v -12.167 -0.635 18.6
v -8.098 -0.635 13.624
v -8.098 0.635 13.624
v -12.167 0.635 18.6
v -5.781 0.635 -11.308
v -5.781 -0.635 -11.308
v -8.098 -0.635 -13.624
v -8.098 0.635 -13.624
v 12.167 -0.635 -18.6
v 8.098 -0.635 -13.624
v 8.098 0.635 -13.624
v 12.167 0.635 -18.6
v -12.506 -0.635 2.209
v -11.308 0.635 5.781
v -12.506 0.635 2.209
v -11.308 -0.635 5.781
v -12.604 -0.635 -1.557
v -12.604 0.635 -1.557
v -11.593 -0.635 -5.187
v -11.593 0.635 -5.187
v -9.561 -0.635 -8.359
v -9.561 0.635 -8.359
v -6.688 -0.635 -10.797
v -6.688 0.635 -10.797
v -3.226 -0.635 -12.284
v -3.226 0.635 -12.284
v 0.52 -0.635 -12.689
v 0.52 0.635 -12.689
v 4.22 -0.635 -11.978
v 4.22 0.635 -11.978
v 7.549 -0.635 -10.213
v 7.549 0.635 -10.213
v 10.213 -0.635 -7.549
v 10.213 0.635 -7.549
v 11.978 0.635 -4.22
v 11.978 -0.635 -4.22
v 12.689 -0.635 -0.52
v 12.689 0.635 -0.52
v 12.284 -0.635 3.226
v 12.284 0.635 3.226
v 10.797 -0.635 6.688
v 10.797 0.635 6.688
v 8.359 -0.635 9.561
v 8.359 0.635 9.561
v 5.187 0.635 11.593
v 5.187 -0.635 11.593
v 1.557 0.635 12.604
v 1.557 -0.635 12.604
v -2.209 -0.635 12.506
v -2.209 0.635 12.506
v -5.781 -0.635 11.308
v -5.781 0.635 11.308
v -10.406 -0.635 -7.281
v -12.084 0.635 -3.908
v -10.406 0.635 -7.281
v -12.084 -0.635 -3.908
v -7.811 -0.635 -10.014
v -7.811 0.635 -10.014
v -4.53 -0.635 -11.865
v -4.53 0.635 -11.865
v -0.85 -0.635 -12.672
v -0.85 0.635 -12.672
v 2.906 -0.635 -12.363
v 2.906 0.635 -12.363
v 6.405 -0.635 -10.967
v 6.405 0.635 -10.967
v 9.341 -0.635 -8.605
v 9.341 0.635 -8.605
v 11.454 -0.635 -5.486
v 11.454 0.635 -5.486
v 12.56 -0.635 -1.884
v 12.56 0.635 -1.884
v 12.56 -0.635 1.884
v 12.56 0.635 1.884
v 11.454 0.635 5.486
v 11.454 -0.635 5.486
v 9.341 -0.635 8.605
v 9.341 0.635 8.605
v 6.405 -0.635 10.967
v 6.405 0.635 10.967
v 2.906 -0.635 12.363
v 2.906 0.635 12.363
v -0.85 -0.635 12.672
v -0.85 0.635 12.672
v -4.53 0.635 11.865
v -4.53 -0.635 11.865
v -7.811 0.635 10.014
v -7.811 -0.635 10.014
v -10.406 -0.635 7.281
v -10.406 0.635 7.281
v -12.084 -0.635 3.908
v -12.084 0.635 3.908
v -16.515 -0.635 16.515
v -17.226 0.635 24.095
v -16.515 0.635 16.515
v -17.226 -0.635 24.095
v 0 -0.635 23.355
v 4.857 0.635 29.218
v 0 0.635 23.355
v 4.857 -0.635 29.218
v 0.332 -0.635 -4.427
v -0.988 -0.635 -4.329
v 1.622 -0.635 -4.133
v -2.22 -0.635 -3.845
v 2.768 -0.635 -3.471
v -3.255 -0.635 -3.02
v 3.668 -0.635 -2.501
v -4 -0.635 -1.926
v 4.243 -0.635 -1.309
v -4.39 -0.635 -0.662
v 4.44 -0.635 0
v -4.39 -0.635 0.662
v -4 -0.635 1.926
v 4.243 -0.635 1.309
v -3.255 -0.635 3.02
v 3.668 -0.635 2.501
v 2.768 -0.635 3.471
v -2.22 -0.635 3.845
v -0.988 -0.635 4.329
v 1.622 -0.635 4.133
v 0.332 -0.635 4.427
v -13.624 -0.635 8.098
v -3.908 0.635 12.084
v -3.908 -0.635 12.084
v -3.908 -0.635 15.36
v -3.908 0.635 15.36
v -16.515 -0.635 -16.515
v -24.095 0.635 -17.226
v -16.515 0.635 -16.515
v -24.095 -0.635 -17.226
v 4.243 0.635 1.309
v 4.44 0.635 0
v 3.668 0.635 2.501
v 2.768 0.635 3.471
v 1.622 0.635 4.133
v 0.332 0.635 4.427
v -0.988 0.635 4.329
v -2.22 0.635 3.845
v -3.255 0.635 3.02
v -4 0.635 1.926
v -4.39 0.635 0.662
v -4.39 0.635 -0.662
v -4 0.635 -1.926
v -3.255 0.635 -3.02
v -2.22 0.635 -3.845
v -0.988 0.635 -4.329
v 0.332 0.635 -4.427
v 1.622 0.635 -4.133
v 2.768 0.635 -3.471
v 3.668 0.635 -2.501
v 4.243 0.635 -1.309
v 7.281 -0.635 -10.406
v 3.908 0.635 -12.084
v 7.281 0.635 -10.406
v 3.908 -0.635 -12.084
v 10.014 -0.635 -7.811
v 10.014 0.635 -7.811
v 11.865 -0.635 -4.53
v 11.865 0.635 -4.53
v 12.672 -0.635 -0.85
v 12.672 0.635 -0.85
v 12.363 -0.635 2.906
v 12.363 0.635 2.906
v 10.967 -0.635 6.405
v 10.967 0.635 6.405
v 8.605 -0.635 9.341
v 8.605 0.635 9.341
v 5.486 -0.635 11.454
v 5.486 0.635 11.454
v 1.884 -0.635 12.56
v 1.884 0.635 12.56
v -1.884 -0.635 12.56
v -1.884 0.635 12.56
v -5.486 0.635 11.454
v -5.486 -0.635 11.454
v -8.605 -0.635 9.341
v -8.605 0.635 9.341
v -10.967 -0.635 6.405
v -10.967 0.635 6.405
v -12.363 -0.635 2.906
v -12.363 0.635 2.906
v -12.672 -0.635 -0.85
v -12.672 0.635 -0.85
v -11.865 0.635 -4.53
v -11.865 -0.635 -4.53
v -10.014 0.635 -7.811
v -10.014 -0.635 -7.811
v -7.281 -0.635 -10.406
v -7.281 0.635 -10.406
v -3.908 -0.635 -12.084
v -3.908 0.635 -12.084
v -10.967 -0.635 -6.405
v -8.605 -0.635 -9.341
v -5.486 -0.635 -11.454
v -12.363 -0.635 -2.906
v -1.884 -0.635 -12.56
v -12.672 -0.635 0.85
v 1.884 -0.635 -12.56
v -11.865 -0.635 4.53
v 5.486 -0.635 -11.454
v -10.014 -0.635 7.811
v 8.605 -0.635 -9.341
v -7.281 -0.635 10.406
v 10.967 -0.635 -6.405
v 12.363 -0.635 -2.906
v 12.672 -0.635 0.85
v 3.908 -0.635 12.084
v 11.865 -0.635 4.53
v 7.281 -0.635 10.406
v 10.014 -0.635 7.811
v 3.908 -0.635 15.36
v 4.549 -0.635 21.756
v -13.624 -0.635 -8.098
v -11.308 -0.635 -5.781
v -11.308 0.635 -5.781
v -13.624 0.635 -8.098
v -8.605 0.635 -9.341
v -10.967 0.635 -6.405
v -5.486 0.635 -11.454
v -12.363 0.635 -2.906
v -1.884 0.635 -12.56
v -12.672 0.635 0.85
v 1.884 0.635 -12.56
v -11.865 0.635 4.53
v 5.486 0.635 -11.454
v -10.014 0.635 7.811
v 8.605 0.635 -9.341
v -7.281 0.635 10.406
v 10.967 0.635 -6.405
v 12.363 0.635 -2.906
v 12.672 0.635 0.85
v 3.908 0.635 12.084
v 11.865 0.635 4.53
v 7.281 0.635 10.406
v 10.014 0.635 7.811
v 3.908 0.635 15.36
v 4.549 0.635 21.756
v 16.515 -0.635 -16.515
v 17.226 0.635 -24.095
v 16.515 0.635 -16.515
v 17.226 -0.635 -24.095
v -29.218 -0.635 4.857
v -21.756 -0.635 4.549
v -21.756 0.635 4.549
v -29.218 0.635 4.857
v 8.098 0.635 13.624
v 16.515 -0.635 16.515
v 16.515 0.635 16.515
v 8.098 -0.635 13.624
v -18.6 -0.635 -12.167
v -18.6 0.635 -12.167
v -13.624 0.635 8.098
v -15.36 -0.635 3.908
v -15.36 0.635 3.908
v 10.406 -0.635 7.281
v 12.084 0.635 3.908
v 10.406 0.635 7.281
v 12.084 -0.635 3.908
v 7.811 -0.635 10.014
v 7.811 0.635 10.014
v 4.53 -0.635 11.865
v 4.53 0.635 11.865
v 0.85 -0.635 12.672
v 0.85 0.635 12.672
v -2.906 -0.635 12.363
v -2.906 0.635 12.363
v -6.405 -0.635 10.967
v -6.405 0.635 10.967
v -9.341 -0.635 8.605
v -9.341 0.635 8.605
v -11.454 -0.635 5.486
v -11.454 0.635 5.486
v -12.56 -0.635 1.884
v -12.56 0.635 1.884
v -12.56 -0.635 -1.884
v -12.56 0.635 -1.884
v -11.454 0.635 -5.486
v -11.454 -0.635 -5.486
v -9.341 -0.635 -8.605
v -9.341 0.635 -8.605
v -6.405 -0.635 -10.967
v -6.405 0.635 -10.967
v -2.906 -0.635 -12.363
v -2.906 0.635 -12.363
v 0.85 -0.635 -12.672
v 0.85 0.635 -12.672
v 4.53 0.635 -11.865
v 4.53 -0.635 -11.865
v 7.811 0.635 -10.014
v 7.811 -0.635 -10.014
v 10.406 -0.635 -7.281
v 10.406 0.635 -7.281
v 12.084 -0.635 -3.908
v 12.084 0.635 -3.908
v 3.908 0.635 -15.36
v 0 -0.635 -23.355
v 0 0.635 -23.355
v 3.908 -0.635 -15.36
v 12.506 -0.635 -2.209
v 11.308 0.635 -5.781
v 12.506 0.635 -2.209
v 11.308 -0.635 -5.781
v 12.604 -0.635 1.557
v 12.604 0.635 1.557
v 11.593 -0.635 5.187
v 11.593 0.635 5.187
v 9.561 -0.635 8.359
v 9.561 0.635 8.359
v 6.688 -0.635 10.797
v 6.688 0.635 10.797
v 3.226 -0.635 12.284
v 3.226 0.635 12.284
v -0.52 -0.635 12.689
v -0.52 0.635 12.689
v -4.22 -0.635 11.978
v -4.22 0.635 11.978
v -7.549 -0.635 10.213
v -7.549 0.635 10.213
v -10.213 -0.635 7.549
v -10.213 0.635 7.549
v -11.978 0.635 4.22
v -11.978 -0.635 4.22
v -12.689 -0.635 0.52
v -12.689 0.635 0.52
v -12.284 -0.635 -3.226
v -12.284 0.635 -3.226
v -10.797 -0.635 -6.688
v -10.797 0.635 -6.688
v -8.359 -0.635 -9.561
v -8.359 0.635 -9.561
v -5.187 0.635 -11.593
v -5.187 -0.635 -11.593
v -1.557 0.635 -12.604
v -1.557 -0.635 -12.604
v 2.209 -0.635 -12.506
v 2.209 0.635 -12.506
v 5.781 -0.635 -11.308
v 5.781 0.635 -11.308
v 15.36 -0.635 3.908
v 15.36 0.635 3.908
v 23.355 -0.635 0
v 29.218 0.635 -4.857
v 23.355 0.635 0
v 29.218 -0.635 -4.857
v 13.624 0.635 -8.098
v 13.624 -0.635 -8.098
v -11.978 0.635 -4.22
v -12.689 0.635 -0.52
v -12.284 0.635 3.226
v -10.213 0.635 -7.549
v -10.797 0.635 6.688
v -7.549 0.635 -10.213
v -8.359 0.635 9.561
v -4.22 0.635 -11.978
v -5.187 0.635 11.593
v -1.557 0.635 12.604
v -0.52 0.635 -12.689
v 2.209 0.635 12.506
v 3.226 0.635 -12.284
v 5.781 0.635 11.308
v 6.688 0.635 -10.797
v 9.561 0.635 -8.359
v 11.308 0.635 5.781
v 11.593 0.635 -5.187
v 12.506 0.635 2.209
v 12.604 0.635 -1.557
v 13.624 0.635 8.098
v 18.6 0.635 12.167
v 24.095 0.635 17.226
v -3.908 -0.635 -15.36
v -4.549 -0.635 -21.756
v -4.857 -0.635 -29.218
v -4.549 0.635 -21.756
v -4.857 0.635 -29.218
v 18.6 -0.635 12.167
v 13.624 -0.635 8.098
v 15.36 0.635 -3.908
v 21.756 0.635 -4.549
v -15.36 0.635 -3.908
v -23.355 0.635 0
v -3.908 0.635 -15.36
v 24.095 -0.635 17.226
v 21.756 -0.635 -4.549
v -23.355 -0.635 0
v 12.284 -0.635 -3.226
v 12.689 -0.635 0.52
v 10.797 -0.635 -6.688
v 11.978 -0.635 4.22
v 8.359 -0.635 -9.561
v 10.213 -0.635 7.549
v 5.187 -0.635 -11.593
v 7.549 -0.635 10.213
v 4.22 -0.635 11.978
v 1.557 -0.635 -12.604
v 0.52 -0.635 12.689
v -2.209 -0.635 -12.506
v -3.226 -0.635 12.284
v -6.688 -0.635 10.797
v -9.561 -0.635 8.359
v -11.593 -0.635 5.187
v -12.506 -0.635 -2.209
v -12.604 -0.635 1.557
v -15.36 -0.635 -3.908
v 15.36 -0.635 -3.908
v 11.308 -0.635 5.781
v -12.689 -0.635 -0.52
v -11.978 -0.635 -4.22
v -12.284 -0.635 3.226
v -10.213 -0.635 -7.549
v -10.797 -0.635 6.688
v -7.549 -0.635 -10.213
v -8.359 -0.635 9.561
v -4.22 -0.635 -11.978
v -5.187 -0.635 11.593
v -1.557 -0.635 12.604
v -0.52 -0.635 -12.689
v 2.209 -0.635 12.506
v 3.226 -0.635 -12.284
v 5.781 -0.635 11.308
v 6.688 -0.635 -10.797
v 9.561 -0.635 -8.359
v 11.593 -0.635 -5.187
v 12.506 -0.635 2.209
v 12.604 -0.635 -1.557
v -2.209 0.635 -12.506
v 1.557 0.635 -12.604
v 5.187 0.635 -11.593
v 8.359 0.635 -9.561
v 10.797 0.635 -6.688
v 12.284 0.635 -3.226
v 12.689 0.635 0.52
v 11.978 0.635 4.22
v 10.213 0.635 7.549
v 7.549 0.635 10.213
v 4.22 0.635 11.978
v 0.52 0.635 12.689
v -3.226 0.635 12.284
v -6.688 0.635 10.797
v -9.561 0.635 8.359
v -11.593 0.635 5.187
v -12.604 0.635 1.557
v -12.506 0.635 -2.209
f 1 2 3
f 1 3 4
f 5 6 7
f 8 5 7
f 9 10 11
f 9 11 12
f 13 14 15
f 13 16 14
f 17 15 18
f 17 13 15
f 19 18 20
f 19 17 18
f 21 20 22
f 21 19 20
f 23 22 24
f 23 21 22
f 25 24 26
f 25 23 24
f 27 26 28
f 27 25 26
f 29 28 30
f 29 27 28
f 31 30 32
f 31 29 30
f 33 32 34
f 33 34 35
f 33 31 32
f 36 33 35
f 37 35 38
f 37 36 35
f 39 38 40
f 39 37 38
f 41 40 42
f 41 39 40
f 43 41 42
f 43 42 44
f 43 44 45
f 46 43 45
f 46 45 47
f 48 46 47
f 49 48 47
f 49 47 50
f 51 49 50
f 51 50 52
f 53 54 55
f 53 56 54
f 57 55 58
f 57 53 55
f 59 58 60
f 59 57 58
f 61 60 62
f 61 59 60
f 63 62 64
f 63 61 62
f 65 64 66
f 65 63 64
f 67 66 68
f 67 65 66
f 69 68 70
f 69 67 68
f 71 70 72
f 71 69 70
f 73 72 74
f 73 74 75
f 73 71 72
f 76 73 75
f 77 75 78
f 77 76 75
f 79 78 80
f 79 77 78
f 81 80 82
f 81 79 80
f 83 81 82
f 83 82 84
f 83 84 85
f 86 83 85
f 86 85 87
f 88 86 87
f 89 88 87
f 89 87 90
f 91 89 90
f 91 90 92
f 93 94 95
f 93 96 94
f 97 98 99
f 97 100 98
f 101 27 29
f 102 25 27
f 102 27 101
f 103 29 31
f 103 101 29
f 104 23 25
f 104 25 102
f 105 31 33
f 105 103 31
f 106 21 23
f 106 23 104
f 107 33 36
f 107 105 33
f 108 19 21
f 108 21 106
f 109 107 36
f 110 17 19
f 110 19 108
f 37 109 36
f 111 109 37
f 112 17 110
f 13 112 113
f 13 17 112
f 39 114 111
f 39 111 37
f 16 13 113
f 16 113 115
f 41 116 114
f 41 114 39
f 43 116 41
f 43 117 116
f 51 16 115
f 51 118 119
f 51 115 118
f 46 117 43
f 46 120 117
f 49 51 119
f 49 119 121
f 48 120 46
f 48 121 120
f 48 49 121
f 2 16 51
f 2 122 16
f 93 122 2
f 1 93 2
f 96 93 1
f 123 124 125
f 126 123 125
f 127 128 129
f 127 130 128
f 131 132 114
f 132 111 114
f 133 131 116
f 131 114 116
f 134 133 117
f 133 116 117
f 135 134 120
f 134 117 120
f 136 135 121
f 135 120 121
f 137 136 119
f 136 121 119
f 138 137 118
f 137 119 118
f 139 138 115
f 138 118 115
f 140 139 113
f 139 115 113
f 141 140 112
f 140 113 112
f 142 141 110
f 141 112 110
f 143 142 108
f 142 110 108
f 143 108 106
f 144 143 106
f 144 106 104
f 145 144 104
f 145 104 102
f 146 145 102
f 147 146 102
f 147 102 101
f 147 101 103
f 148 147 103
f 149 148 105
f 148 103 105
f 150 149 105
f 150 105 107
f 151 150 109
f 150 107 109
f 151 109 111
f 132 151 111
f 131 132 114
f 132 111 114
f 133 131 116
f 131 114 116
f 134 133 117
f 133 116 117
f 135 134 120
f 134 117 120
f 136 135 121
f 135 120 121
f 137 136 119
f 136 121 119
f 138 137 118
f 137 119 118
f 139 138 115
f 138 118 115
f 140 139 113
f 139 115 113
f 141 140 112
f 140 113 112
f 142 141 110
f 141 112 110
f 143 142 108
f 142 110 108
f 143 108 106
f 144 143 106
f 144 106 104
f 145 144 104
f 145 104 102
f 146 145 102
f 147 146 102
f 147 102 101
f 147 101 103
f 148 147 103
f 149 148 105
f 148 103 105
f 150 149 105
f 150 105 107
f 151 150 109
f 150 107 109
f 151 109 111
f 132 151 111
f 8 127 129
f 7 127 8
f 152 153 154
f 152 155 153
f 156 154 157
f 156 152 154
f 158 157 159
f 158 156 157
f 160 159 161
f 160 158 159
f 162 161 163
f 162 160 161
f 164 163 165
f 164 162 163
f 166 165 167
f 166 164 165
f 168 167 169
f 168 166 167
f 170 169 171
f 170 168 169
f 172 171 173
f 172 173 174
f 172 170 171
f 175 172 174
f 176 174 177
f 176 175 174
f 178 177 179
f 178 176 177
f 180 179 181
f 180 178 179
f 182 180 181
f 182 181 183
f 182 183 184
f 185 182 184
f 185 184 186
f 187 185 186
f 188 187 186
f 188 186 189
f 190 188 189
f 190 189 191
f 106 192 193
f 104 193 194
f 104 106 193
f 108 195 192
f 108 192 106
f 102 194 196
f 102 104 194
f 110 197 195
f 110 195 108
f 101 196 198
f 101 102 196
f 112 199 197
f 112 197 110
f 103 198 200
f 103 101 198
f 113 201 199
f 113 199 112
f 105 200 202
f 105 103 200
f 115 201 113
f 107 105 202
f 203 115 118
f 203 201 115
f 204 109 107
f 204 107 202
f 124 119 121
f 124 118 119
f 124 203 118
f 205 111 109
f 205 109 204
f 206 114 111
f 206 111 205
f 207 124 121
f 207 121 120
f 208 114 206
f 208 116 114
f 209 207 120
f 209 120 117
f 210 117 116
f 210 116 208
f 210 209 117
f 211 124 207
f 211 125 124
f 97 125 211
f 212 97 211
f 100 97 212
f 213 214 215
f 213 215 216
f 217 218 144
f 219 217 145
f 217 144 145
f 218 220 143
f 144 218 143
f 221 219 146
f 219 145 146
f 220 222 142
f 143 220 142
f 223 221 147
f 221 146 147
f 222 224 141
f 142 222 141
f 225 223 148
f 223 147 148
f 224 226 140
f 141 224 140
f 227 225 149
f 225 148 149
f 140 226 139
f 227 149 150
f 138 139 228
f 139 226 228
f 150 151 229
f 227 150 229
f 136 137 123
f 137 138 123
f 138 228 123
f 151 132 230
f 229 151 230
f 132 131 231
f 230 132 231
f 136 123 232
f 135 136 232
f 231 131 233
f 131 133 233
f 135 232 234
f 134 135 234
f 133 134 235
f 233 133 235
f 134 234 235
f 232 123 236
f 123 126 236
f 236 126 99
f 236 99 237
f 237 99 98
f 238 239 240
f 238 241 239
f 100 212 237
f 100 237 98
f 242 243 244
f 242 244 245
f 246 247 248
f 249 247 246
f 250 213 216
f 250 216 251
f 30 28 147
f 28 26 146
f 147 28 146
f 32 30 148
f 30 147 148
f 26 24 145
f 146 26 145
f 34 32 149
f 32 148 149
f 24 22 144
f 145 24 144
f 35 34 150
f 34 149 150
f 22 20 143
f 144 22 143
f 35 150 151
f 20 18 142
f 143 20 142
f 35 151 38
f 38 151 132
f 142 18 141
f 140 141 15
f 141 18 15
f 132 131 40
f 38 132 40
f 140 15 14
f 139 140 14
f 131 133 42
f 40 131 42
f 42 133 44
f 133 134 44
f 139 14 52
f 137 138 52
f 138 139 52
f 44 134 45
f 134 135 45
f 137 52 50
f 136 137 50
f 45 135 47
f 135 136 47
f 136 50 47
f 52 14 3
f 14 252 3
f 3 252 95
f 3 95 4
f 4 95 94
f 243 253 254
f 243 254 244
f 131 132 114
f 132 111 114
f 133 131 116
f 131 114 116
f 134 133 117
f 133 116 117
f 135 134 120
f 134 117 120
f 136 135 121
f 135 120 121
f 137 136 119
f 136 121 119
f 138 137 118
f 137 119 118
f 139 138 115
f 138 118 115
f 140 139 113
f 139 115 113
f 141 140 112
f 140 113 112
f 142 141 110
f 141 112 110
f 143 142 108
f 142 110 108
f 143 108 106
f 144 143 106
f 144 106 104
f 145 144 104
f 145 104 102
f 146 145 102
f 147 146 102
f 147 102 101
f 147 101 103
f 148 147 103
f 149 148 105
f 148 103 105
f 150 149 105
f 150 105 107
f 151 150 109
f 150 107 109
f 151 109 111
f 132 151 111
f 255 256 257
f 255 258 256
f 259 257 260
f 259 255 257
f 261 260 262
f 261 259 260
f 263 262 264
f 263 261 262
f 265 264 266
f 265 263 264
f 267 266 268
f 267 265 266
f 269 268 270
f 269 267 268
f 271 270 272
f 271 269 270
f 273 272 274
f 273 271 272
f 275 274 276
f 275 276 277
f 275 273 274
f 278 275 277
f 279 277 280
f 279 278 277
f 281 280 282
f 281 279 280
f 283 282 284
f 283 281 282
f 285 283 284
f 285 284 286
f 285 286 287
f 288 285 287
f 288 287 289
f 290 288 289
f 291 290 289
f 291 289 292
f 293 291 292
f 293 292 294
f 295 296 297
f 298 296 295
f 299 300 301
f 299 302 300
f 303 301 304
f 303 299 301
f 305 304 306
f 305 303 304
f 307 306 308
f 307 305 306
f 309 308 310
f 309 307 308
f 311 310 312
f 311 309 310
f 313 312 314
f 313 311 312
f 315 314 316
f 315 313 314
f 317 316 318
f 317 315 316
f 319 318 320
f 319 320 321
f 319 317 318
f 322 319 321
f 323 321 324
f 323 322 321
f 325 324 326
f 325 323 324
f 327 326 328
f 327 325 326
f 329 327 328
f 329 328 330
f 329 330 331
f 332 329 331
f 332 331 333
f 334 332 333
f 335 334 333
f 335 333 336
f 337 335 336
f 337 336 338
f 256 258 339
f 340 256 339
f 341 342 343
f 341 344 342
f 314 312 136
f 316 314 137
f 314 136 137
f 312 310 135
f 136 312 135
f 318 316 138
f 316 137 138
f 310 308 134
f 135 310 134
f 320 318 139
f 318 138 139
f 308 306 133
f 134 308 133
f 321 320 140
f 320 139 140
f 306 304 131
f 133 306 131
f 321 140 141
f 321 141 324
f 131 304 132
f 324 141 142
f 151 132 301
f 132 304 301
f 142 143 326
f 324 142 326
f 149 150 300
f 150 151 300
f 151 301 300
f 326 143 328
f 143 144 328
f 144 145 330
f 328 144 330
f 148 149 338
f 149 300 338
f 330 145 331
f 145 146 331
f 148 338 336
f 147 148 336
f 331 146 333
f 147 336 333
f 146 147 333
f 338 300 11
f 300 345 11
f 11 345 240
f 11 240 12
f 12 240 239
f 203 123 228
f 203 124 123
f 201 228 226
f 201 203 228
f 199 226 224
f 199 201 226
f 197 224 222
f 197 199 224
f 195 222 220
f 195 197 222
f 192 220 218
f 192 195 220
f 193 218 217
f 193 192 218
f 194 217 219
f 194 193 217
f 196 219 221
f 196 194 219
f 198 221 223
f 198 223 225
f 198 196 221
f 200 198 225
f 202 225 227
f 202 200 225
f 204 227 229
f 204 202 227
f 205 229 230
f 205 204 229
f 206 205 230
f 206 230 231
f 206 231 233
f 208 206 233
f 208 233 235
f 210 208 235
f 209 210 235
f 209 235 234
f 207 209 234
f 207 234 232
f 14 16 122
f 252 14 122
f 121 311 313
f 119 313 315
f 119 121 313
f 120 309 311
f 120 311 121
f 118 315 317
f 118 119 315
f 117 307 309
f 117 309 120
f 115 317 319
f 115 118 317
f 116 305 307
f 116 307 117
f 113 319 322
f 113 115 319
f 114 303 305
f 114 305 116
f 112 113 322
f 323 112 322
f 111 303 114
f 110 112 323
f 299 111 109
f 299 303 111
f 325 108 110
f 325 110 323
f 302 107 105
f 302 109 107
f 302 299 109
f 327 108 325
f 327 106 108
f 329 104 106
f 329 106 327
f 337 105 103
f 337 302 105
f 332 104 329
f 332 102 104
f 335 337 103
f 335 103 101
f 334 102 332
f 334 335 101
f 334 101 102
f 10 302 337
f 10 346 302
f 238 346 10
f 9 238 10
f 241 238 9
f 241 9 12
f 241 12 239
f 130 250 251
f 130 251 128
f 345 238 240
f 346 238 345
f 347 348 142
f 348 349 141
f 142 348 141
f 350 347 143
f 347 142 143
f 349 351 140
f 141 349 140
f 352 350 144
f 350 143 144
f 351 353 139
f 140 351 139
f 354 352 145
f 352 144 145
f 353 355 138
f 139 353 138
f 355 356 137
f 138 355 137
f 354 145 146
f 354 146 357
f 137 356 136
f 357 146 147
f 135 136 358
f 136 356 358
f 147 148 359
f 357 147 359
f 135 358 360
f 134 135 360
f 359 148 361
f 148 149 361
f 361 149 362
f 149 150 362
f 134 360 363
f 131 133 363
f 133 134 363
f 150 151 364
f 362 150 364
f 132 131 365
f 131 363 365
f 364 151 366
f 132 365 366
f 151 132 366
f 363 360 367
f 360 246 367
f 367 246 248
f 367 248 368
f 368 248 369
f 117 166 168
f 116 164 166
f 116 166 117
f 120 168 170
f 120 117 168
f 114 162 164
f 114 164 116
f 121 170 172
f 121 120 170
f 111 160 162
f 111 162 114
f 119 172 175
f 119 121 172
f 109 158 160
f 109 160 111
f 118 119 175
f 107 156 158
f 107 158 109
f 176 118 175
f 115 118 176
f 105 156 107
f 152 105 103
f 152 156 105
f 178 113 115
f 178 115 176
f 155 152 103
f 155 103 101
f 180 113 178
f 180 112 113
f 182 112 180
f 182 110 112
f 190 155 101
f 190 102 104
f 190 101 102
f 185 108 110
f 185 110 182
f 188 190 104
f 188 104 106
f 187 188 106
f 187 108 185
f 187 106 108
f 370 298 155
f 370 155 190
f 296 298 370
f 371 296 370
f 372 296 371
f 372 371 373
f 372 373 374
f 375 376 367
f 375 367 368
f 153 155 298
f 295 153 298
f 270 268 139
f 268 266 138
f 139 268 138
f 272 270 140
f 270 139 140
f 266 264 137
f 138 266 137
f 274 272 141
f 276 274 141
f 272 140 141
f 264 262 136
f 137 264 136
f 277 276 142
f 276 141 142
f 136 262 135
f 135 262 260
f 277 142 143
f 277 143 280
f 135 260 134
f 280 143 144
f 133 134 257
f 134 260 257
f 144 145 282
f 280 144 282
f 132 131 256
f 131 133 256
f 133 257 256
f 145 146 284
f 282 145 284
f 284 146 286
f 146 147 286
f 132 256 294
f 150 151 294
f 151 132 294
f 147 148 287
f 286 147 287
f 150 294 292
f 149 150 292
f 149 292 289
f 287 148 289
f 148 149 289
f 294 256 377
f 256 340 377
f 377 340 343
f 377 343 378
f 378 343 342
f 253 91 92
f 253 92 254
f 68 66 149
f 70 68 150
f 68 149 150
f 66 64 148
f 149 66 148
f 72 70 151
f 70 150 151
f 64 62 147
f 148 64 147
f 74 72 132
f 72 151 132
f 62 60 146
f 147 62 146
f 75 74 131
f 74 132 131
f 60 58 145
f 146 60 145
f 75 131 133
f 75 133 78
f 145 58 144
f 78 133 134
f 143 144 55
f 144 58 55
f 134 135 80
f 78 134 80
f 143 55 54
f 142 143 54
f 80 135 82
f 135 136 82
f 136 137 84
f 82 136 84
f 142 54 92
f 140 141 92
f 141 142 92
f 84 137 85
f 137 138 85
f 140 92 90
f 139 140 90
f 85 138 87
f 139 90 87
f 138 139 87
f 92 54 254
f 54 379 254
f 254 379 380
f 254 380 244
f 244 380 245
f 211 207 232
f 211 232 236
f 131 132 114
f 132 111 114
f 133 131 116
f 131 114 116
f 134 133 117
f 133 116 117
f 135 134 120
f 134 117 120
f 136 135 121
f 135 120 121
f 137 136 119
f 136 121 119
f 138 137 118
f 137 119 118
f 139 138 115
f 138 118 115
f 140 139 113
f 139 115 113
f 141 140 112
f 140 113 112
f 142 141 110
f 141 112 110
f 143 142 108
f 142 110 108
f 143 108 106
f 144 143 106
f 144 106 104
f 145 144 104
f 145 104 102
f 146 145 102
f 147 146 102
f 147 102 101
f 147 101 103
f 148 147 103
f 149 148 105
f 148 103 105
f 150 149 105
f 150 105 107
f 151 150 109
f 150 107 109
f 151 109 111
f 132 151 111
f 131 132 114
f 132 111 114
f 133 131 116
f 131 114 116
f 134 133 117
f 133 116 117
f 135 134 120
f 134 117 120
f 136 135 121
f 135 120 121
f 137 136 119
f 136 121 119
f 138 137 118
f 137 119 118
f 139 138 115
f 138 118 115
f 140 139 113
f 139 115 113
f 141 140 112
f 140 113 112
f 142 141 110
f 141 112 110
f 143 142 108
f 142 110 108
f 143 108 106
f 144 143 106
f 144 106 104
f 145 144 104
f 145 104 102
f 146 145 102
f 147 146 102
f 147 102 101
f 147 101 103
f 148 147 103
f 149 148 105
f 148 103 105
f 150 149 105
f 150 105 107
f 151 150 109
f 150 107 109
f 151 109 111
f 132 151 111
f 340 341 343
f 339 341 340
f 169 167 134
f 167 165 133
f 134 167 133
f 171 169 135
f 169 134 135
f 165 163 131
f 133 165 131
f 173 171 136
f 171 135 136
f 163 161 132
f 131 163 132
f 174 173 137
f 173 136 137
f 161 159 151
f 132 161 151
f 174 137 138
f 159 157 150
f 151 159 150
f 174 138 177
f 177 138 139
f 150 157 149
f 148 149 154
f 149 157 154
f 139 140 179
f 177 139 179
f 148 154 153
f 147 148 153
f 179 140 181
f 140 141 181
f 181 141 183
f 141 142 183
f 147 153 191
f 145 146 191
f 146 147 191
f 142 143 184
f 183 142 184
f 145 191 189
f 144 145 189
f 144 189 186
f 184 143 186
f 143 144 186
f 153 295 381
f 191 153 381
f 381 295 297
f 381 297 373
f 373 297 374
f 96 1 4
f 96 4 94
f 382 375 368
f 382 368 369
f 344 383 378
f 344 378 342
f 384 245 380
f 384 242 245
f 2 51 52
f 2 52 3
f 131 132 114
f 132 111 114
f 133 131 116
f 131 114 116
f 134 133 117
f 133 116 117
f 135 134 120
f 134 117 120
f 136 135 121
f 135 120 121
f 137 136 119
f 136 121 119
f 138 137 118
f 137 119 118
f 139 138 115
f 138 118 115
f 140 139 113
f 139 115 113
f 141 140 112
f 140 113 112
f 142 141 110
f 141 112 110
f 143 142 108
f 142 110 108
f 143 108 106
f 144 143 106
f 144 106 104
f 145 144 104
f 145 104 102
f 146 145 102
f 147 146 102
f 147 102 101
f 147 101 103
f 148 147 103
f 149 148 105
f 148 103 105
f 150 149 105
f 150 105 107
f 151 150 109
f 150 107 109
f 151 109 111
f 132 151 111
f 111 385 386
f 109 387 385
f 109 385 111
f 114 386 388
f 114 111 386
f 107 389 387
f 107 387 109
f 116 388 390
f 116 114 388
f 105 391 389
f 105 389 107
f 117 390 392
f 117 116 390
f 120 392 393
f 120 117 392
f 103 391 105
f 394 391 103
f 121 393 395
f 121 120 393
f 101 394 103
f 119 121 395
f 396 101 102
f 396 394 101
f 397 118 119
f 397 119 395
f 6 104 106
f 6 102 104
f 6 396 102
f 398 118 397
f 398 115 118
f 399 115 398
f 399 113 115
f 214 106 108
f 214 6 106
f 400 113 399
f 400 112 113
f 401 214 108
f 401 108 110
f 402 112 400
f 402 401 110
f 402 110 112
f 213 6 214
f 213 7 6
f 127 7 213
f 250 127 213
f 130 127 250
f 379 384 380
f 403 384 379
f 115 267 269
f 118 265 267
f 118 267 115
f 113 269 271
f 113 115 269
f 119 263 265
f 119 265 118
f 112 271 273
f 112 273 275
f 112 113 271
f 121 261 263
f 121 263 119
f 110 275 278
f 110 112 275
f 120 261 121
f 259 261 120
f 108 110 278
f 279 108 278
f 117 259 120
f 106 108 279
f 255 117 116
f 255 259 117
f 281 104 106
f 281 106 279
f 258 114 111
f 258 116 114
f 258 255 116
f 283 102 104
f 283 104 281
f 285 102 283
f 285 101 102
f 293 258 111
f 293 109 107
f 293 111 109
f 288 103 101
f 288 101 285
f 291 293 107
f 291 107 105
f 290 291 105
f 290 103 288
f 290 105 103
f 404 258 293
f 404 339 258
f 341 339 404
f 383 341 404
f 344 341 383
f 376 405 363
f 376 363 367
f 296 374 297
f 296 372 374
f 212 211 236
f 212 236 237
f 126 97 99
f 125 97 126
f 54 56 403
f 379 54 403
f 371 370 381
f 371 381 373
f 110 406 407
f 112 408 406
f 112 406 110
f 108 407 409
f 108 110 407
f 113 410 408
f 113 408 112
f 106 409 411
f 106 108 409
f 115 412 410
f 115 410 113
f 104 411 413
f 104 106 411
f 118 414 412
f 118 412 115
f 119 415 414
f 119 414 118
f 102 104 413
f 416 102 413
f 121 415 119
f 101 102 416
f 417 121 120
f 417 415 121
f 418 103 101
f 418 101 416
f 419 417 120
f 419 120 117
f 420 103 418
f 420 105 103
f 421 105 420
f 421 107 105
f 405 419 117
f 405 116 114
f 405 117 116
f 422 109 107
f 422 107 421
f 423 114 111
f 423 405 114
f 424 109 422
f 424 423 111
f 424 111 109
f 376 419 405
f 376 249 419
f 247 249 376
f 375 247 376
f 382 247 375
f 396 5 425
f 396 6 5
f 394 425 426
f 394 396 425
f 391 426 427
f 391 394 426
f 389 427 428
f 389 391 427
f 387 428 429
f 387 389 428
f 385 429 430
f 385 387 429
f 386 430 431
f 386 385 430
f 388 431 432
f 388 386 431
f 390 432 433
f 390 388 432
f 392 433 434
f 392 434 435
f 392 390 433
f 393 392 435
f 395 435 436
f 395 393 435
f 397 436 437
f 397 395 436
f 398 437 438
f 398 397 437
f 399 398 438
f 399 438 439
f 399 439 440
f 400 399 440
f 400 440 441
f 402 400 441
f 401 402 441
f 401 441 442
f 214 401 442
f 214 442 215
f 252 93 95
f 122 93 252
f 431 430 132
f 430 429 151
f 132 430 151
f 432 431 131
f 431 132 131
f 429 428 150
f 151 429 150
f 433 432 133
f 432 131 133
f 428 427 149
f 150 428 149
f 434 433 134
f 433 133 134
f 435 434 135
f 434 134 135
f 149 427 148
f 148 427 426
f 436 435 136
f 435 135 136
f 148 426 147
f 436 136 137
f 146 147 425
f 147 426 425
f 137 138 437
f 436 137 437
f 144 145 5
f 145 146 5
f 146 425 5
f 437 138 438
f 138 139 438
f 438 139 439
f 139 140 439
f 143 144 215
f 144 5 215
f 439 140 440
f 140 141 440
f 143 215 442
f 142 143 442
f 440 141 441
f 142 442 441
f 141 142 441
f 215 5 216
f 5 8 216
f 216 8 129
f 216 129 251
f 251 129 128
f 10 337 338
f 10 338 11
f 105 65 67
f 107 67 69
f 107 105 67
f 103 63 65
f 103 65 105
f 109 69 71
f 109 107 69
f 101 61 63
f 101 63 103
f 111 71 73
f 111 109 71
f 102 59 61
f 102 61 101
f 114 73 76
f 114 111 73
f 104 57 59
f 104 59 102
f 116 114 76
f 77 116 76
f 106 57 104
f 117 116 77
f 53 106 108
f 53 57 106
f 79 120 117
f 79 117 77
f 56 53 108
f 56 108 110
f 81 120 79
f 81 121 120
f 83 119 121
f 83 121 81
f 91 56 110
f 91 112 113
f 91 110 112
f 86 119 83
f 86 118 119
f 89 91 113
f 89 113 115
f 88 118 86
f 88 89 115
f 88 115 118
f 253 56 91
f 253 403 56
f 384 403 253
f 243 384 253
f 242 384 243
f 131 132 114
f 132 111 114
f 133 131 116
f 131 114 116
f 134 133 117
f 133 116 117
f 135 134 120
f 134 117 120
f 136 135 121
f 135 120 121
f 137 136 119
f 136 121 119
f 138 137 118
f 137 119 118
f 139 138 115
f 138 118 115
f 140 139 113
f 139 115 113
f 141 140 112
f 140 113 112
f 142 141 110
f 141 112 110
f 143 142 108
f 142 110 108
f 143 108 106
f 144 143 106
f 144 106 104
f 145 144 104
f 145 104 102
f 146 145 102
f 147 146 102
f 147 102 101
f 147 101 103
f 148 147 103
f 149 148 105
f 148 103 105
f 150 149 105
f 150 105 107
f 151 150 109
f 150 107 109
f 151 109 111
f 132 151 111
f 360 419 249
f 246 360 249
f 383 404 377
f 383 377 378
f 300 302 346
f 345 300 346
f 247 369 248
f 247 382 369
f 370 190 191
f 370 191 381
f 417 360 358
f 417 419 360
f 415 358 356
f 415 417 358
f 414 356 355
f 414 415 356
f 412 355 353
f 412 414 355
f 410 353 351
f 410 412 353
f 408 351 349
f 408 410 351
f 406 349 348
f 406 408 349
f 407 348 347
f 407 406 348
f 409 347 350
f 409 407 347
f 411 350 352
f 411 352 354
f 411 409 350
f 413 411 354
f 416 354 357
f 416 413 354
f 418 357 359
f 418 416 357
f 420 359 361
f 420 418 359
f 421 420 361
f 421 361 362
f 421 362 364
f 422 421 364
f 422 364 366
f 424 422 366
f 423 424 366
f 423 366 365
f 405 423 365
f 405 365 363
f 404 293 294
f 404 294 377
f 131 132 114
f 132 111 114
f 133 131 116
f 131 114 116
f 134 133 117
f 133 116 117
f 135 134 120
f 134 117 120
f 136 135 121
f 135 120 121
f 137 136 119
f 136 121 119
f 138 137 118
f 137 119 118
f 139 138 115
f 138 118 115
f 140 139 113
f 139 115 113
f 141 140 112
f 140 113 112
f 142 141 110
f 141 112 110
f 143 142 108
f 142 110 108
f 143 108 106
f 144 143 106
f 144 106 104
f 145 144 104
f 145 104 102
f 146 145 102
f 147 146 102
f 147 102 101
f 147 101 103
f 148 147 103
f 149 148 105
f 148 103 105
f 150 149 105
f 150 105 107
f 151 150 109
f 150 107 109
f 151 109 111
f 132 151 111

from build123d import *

# Parameters (mm, degrees)
F0_R     = 12.7
F1_DEPTH = 0.635
F2_W     = 7.815492
F2_H     = 5.961056
F3_DEPTH = 0.635
F4_COUNT = 8
F5_R     = 4.439905
F6_DEPTH = 0.635


with BuildPart() as f1:
    # F0 (on Front) → F1 (new body, symmetric)
    with BuildSketch(Plane.XZ):
        Circle(F0_R)
    extrude(amount=F1_DEPTH, both=True)

    # F2 (on Front) → F3 (join, symmetric)
    with BuildSketch(Plane.XZ):
        with Locations((0, 12.379177)):
            Rectangle(F2_W, F2_H)
        Polygon((-3.907746, 15.359705), (3.907746, 15.359705), (4.549023, 21.755937), (0, 23.355249), align=None)
        Polygon((0, 23.355249), (4.549023, 21.755937), (4.856857, 29.218012), align=None)
    extrude(amount=F3_DEPTH, both=True)


with BuildPart() as f4_1:
    # F4: instance of F1
    add(f1.part.rotate(Axis((0, -0.635, 0), (0, 1, 0)), 1 * 360 / F4_COUNT))


with BuildPart() as f4_2:
    # F4: instance of F1
    add(f1.part.rotate(Axis((0, -0.635, 0), (0, 1, 0)), 2 * 360 / F4_COUNT))


with BuildPart() as f4_3:
    # F4: instance of F1
    add(f1.part.rotate(Axis((0, -0.635, 0), (0, 1, 0)), 3 * 360 / F4_COUNT))


with BuildPart() as f4_4:
    # F4: instance of F1
    add(f1.part.rotate(Axis((0, -0.635, 0), (0, 1, 0)), 4 * 360 / F4_COUNT))


with BuildPart() as f4_5:
    # F4: instance of F1
    add(f1.part.rotate(Axis((0, -0.635, 0), (0, 1, 0)), 5 * 360 / F4_COUNT))


with BuildPart() as f4_6:
    # F4: instance of F1
    add(f1.part.rotate(Axis((0, -0.635, 0), (0, 1, 0)), 6 * 360 / F4_COUNT))


with BuildPart() as f4_7:
    # F4: instance of F1
    add(f1.part.rotate(Axis((0, -0.635, 0), (0, 1, 0)), 7 * 360 / F4_COUNT))


with BuildPart() as f6_tool:
    # F5 (on Front) → F6 (new body, symmetric)
    with BuildSketch(Plane.XZ):
        Circle(F5_R)
    extrude(amount=F6_DEPTH, both=True)


with BuildPart() as f1_1:
    add(f1.part)

    # F6: cut by f6_tool
    add(f6_tool.part, mode=Mode.SUBTRACT)


with BuildPart() as f4_1_1:
    add(f4_1.part)

    # F6: cut by f6_tool
    add(f6_tool.part, mode=Mode.SUBTRACT)


with BuildPart() as f4_2_1:
    add(f4_2.part)

    # F6: cut by f6_tool
    add(f6_tool.part, mode=Mode.SUBTRACT)


with BuildPart() as f4_3_1:
    add(f4_3.part)

    # F6: cut by f6_tool
    add(f6_tool.part, mode=Mode.SUBTRACT)


with BuildPart() as f4_4_1:
    add(f4_4.part)

    # F6: cut by f6_tool
    add(f6_tool.part, mode=Mode.SUBTRACT)


with BuildPart() as f4_5_1:
    add(f4_5.part)

    # F6: cut by f6_tool
    add(f6_tool.part, mode=Mode.SUBTRACT)


with BuildPart() as f4_6_1:
    add(f4_6.part)

    # F6: cut by f6_tool
    add(f6_tool.part, mode=Mode.SUBTRACT)


with BuildPart() as f4_7_1:
    add(f4_7.part)

    # F6: cut by f6_tool
    add(f6_tool.part, mode=Mode.SUBTRACT)


solid = Compound([f1_1.part, f4_1_1.part, f4_2_1.part, f4_3_1.part, f4_4_1.part, f4_5_1.part, f4_6_1.part, f4_7_1.part])
